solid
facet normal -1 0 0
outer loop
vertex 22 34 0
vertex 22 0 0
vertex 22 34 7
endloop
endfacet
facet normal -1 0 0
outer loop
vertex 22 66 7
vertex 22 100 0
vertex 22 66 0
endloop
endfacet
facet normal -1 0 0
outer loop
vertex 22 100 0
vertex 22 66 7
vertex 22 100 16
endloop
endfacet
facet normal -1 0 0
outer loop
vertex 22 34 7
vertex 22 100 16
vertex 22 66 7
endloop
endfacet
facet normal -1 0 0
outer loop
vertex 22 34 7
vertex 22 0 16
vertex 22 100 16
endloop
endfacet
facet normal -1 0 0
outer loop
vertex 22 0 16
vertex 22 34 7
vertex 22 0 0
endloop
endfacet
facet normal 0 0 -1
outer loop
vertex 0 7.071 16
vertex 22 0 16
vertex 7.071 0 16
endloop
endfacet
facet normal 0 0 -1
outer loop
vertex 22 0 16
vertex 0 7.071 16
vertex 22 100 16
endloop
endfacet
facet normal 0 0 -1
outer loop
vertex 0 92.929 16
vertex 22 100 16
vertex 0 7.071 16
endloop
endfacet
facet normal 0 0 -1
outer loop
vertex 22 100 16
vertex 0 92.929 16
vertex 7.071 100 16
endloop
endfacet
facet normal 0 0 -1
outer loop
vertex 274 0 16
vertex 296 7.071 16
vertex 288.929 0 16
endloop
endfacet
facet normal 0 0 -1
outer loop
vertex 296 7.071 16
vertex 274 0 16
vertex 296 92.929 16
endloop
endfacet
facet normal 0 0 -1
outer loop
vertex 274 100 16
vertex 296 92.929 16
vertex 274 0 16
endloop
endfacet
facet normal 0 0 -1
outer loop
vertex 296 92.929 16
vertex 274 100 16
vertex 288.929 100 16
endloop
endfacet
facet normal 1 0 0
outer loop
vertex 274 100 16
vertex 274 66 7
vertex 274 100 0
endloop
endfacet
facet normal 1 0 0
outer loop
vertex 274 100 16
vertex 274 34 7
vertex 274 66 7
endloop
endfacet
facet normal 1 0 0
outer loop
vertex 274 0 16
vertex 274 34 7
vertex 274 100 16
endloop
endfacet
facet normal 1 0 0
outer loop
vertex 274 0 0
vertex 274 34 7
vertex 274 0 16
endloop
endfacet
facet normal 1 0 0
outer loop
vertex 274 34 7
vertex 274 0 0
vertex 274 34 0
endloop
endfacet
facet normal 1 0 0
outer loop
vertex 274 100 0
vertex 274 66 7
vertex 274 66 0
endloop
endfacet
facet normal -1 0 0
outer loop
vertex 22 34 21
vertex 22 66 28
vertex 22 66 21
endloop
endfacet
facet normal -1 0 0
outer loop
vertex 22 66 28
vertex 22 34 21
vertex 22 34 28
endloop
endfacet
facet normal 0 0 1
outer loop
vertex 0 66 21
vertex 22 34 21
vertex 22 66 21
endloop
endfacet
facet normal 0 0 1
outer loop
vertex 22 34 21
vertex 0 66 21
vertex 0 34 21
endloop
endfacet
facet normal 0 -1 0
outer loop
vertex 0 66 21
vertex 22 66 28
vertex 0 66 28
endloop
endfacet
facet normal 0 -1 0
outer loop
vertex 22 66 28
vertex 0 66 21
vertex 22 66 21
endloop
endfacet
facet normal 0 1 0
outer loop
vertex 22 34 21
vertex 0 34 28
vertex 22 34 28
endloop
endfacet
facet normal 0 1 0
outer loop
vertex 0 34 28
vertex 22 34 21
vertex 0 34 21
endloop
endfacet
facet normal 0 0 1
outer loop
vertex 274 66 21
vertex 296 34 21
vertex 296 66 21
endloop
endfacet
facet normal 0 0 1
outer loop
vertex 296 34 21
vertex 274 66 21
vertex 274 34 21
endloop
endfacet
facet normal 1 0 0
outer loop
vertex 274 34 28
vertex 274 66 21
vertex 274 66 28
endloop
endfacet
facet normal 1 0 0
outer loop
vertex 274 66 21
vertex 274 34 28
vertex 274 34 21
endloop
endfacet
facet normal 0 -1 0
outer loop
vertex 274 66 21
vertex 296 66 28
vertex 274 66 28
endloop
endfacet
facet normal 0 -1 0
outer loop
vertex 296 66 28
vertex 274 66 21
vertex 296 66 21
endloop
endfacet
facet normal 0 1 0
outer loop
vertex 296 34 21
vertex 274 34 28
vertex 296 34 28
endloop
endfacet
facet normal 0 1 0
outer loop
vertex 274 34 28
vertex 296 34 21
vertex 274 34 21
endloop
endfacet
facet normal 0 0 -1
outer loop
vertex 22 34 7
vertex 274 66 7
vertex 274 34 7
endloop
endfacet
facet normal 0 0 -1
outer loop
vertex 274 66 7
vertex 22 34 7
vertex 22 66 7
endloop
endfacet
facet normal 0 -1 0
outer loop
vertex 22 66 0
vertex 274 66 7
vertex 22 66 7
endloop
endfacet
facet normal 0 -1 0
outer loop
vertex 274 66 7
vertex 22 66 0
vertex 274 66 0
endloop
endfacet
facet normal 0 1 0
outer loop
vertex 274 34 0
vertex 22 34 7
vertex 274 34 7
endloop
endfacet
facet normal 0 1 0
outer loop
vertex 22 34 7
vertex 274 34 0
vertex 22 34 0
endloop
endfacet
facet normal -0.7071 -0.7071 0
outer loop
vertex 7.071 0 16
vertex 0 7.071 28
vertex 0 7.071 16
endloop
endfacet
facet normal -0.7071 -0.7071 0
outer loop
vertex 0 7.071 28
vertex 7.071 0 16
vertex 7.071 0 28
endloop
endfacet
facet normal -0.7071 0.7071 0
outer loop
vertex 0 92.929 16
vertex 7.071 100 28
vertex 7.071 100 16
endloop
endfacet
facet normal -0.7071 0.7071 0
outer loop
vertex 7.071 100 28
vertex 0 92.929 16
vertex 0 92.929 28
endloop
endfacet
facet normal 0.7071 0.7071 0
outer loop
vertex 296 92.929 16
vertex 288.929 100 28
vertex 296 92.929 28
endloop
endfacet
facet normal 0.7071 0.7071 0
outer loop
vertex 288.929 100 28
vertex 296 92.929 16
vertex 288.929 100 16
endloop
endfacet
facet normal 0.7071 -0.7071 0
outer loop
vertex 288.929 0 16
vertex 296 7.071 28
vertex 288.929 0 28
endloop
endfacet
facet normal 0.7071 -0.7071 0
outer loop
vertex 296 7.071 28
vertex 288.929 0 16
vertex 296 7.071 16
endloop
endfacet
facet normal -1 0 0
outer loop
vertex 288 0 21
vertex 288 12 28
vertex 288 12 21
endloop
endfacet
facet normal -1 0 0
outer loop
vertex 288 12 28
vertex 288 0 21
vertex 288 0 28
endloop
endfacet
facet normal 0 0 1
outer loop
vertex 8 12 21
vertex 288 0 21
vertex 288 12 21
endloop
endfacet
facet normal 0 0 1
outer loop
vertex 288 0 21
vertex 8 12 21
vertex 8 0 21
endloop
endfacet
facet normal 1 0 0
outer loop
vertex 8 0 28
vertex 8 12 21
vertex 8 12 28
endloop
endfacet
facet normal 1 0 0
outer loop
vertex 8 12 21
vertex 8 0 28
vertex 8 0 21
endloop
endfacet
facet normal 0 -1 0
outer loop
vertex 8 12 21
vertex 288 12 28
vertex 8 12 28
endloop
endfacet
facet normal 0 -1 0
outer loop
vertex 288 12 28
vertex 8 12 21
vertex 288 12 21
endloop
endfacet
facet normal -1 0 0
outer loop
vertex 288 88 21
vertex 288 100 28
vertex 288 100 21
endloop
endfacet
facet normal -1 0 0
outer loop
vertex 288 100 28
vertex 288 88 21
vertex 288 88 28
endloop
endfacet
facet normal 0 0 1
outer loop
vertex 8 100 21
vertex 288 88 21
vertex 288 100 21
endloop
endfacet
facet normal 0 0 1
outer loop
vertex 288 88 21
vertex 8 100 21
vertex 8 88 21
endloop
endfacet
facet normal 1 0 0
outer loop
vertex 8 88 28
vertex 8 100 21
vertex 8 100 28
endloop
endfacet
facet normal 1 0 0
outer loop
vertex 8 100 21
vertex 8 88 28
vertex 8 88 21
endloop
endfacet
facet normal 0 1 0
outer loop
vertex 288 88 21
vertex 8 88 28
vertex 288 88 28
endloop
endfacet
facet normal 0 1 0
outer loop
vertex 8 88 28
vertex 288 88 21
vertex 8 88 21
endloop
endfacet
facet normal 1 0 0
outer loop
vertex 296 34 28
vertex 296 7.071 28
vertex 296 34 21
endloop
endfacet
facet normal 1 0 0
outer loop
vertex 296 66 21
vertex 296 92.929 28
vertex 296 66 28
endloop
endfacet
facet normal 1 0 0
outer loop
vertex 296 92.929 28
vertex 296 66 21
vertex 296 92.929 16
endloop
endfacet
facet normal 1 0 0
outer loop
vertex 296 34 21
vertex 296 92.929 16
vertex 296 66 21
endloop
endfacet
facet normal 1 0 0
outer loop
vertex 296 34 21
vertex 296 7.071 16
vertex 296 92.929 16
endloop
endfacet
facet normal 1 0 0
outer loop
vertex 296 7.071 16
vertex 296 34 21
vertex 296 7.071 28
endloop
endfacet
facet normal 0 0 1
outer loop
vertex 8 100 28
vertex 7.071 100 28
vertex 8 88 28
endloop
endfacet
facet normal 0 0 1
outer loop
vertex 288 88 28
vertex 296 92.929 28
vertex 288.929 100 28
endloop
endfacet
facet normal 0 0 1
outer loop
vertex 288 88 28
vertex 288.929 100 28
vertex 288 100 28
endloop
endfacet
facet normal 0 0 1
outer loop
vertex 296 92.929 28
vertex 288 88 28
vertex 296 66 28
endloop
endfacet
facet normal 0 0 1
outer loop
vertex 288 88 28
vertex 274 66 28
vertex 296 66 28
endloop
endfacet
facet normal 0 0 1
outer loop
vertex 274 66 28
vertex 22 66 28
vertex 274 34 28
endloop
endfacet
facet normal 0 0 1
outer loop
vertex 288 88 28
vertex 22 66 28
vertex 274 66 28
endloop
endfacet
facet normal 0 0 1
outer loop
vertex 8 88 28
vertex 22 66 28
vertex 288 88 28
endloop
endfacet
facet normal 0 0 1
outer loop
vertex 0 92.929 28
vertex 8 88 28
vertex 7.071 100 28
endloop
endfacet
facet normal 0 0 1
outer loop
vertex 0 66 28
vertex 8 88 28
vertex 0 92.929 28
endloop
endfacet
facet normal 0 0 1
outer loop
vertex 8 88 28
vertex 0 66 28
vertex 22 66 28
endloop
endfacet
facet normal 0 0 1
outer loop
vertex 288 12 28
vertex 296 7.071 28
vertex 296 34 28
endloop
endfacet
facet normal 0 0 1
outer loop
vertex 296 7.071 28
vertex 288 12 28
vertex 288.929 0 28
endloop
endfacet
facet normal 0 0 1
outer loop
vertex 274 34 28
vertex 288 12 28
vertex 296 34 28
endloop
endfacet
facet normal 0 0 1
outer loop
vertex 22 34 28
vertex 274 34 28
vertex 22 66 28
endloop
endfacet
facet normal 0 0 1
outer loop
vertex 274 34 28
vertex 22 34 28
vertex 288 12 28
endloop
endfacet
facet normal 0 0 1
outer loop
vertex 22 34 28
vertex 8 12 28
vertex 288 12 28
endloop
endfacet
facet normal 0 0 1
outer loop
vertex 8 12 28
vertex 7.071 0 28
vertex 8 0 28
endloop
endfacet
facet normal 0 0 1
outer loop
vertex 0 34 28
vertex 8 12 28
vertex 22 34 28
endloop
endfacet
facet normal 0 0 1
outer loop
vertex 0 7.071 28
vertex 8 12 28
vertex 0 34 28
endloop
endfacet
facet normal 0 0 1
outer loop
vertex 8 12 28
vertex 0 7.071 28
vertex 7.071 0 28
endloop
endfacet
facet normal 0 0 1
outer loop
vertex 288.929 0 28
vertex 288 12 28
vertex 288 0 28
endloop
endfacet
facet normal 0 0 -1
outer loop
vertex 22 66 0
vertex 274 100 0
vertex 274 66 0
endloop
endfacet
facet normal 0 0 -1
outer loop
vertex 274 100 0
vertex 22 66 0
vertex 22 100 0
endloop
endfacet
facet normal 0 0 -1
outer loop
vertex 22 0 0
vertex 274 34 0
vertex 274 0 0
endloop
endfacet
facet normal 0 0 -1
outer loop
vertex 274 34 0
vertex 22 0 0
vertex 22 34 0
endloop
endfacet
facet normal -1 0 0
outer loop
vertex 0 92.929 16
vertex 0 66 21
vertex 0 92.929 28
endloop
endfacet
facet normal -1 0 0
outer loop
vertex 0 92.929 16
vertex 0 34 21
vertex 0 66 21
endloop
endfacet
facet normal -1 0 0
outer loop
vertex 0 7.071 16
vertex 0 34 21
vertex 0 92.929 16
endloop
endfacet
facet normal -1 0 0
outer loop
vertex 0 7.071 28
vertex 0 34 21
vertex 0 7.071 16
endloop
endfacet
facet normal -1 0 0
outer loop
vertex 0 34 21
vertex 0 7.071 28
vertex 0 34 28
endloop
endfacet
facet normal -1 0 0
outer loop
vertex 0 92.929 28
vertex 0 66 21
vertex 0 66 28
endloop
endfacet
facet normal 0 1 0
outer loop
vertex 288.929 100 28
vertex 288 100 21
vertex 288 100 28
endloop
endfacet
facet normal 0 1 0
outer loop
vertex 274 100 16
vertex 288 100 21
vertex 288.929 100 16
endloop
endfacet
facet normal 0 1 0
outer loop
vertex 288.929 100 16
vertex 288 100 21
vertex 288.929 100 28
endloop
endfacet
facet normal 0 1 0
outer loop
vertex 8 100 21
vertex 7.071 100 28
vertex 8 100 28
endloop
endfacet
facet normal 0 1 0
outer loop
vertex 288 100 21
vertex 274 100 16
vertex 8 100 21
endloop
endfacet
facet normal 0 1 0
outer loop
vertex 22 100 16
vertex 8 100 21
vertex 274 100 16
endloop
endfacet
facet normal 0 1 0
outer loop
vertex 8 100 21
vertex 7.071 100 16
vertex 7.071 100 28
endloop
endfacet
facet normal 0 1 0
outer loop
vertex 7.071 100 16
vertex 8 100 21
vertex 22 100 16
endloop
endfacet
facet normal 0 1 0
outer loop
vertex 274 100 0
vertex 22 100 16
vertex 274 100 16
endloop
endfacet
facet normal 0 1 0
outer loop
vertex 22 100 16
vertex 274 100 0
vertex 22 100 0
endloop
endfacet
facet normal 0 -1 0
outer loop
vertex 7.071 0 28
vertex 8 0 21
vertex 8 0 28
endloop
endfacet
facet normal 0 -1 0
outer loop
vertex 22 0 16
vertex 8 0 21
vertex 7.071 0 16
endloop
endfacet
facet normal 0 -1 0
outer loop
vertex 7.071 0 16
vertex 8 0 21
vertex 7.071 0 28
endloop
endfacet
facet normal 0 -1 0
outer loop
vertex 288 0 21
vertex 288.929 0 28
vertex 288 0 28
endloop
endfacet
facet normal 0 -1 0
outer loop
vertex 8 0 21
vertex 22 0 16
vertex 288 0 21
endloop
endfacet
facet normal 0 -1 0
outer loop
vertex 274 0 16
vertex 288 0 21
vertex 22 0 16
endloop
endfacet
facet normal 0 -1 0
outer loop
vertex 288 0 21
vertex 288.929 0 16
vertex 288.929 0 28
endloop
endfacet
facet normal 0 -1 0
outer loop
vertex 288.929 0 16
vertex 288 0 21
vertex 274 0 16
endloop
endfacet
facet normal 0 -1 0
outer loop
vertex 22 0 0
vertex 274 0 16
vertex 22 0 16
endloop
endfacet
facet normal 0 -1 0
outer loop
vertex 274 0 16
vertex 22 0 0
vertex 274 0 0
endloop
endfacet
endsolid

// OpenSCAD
include <../src/wardrobe.scad>;
plank_yx_middle_bottom();
//github_openscad -o wardrobe_3/plank_yx_middle_bottom.stl -D wardrobe_n=3 -D cutting_edge=0 -D break_view_length=0 wardrobe_3/plank_yx_middle_bottom_stl.scad
